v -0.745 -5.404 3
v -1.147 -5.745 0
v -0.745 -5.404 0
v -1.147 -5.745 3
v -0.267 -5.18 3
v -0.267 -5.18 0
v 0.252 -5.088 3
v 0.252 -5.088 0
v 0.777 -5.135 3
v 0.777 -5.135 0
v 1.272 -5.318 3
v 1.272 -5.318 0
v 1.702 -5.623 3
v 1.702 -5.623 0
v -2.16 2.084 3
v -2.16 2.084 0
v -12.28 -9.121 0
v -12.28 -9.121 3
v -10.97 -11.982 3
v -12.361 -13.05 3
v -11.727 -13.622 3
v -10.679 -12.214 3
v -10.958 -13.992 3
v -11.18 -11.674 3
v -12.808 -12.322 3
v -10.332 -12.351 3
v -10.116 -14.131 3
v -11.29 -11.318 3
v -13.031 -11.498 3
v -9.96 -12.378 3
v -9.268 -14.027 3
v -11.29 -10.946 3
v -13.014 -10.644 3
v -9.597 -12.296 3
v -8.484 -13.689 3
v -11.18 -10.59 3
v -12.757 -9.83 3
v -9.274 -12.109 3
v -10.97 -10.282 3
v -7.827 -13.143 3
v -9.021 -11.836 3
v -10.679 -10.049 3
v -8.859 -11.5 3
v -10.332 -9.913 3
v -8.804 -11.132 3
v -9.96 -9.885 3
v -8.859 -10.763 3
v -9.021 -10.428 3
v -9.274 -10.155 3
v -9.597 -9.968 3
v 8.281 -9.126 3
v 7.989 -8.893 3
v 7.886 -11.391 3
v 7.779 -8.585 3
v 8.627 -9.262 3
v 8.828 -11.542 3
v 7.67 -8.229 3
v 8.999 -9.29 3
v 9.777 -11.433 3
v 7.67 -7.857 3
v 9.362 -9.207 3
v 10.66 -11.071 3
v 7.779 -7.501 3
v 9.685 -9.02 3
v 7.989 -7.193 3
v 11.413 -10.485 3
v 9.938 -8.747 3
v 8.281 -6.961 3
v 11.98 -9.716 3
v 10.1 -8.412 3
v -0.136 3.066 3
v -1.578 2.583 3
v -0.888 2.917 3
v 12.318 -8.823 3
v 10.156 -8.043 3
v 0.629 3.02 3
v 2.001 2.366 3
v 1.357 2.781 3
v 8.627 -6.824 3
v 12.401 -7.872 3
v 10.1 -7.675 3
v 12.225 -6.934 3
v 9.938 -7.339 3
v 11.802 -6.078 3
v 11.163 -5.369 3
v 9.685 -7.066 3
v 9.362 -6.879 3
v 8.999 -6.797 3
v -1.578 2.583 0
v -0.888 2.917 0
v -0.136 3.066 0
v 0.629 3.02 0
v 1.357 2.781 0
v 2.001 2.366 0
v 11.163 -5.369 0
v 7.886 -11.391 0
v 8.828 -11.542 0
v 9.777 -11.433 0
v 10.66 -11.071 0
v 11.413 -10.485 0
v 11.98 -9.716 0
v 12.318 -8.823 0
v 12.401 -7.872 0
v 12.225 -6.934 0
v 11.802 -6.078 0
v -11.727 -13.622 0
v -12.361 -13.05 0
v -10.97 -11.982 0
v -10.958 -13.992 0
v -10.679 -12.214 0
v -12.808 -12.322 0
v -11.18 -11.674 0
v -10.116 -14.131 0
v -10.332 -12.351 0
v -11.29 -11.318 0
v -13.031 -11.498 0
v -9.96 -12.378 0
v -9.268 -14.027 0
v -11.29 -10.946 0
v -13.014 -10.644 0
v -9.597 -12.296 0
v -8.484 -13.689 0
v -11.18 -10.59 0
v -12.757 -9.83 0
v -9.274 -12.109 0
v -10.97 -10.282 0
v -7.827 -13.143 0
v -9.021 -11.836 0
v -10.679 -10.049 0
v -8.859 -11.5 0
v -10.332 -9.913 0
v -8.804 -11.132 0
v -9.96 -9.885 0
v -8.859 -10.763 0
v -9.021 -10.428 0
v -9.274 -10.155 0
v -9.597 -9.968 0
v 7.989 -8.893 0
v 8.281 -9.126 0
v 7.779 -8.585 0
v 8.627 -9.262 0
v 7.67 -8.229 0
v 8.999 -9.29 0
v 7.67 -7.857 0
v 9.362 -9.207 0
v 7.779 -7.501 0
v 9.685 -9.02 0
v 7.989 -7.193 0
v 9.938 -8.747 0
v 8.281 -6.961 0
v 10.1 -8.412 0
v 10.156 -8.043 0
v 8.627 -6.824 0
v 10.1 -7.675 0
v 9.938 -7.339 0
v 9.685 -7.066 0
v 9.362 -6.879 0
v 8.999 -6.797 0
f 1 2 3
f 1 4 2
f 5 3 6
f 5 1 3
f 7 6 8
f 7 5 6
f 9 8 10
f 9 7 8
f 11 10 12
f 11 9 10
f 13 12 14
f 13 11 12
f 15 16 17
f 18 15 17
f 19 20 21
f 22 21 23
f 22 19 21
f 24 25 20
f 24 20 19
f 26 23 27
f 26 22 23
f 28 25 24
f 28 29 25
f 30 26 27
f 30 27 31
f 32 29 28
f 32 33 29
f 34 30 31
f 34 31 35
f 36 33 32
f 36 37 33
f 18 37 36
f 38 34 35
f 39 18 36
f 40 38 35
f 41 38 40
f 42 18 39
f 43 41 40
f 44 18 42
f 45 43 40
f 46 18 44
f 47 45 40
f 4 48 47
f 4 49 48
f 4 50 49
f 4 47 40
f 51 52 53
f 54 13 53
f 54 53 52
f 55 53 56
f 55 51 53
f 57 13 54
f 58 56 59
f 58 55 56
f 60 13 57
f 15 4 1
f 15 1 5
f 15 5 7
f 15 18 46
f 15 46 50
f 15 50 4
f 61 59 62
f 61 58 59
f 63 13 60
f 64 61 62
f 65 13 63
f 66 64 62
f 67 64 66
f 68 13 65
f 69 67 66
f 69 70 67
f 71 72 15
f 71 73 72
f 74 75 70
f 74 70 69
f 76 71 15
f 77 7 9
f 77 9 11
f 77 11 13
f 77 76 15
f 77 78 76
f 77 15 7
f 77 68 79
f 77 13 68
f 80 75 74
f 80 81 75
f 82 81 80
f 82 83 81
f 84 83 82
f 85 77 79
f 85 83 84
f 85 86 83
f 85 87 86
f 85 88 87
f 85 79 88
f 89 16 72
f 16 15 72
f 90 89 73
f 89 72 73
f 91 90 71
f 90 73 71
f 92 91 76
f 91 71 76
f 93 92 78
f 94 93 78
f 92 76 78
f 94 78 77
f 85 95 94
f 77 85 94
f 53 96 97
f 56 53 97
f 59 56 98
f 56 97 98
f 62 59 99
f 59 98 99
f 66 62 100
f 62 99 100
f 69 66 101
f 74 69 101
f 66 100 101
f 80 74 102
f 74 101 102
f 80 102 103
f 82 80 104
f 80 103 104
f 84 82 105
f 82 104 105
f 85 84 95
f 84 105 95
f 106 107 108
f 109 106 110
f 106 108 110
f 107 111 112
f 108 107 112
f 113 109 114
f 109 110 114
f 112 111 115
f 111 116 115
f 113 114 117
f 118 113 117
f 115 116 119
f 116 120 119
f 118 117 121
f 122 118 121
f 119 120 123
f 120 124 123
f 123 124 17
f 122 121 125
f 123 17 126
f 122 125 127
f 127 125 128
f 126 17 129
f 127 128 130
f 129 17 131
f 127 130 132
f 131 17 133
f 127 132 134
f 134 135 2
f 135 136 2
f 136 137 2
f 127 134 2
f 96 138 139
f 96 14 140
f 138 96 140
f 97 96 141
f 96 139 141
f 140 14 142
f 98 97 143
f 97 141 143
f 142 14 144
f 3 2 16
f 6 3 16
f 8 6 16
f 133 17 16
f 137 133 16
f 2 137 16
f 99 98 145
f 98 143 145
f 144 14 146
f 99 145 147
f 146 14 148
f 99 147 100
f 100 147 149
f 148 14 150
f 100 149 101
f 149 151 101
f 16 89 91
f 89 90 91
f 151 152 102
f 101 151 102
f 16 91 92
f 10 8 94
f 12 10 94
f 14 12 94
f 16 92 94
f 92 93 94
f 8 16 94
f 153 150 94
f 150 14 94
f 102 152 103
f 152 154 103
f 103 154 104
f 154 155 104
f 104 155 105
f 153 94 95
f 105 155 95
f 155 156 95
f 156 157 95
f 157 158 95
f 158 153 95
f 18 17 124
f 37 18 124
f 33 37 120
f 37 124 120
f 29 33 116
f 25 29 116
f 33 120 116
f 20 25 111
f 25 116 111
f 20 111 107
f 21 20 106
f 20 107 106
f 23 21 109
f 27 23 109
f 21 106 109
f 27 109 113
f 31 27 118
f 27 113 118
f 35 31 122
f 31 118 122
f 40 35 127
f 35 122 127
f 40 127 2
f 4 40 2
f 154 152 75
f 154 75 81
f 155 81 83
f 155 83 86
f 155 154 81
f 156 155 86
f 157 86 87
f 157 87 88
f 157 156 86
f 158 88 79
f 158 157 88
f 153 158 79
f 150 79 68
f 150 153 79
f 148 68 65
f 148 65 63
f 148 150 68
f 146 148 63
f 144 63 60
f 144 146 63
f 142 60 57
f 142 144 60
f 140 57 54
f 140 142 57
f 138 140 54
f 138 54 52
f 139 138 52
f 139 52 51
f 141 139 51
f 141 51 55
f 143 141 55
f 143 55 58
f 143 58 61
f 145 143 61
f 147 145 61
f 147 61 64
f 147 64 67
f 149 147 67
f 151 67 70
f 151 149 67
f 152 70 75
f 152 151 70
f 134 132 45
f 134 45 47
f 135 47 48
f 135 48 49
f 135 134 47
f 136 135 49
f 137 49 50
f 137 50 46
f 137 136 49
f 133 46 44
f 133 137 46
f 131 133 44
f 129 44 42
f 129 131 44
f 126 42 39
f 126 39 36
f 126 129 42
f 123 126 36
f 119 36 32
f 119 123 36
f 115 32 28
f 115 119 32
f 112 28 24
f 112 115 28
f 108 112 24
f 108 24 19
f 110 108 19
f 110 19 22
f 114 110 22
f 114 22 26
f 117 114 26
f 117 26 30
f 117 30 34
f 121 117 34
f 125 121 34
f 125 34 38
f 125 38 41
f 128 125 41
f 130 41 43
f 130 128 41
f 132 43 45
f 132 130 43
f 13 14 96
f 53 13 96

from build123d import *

# Parameters (mm, degrees)
SKETCH1_R           = 1.25
BOSS_EXTRUDE1_DEPTH = 3
FILLET1_R           = 3
FILLET2_R           = 2


with BuildPart() as part:
    # Sketch1 → Boss-Extrude1 (new body)
    with BuildSketch(Plane.XY):
        with BuildLine():
            Line((-0.215618695, 4.237158078), (-12.280236844, -9.121172241))
            ThreePointArc((-12.280236844, -9.121172241), (-12.064618149, -13.358330319), (-7.827460071, -13.142711624))
            Line((-7.827460071, -13.142711624), (0.215618695, -4.237158078))
            Line((0.215618695, -4.237158078), (7.885671037, -11.391188631))
            ThreePointArc((7.885671037, -11.391188631), (11.979783579, -9.716132772), (11.163266713, -5.368619707))
            Line((11.163266713, -5.368619707), (-0.215618695, 4.237158078))
        make_face()
        with Locations((-10.053848457, -11.131941933)):
            Circle(SKETCH1_R, mode=Mode.SUBTRACT)
        with Locations((8.905553546, -8.043078766)):
            Circle(SKETCH1_R, mode=Mode.SUBTRACT)
    extrude(amount=BOSS_EXTRUDE1_DEPTH)

    # Fillet1
    fillet1_edges = [part.edges().sort_by_distance(p)[0] for p in [
        (-0.215618695, 4.237158078, 1.5),
    ]]
    fillet(fillet1_edges, radius=FILLET1_R)

    # Fillet2
    fillet2_edges = [part.edges().sort_by_distance(p)[0] for p in [
        (0.215618695, -4.237158078, 1.5),
    ]]
    fillet(fillet2_edges, radius=FILLET2_R)


solid = part.part
